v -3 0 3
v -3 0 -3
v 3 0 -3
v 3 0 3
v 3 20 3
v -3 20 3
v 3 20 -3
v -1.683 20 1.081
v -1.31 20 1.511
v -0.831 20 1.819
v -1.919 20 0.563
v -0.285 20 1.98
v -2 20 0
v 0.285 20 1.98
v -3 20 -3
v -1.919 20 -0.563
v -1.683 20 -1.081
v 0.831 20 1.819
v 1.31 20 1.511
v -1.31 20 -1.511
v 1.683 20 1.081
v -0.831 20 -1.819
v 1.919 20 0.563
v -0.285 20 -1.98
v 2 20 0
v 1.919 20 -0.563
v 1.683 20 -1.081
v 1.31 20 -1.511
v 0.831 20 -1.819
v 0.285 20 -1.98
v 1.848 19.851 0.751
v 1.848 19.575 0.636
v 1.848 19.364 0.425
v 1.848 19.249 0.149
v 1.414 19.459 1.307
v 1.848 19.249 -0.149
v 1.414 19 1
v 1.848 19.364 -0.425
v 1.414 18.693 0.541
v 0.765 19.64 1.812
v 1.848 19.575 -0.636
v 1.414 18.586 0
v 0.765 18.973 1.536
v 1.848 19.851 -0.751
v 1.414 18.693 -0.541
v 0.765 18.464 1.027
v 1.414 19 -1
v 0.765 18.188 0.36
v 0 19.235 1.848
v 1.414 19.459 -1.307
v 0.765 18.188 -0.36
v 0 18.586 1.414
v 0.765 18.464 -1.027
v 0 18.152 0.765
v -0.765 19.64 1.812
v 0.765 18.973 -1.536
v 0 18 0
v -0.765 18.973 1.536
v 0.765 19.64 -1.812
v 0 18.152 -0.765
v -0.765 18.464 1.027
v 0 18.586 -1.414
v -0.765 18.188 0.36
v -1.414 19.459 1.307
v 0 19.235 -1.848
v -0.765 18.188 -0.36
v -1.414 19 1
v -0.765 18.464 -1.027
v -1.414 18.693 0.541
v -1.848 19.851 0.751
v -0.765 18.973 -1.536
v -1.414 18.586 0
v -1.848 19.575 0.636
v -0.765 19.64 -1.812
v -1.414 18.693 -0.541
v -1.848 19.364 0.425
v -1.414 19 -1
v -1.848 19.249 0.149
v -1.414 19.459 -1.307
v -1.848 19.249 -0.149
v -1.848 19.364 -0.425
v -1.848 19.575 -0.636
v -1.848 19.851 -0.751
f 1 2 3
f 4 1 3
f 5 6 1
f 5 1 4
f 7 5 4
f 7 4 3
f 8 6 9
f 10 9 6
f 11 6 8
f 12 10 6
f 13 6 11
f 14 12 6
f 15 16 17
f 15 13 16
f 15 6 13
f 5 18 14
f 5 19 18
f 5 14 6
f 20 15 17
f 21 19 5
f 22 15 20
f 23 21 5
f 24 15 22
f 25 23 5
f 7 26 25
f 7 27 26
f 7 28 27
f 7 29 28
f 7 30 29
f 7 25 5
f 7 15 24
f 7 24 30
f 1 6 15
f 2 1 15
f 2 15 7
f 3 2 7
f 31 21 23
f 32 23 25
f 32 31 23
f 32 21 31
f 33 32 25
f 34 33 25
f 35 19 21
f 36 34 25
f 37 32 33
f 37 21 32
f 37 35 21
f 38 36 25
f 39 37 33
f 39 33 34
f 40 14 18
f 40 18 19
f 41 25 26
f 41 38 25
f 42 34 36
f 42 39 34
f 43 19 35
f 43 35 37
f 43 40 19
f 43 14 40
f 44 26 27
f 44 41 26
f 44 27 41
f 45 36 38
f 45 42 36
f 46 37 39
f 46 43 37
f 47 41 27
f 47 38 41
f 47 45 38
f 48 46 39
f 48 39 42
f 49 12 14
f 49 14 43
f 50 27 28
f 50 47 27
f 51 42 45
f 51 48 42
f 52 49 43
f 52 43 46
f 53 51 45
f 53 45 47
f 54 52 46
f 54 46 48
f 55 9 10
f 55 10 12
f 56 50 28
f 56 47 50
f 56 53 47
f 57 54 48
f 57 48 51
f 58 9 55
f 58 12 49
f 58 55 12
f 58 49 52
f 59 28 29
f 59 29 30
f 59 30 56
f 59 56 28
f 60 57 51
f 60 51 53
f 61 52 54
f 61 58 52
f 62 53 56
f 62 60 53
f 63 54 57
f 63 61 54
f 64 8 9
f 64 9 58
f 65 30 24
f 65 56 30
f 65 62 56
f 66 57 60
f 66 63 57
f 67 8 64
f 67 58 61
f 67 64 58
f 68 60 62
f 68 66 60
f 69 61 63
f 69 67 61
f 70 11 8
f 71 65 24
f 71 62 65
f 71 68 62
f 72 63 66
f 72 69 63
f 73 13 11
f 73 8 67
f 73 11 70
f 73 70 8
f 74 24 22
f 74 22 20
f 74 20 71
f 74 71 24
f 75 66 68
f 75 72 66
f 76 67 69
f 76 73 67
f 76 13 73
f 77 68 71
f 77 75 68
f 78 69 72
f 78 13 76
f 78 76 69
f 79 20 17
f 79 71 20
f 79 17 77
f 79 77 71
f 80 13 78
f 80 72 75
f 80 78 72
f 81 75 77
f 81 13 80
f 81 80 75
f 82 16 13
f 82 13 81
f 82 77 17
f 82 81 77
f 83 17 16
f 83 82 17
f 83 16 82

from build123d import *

# Parameters (mm, degrees)
SKETCH1_W           = 6
SKETCH1_H           = 6
BOSS_EXTRUDE1_DEPTH = 20


with BuildPart() as part:
    # Sketch1 → Boss-Extrude1 (new body)
    with BuildSketch(Plane(origin=(0, 0, 0), x_dir=(1, 0, 0), z_dir=(0, 1, 0))):
        Rectangle(SKETCH1_W, SKETCH1_H)
    extrude(amount=BOSS_EXTRUDE1_DEPTH)

    # Sketch3 → Cut-Revolve1 (revolve, cut)
    with BuildSketch(Plane(origin=(0, 20, 0), x_dir=(1, 0, 0), z_dir=(0, 1, 0))):
        with BuildLine():
            Line((-2, 0), (2, 0))
            ThreePointArc((2, 0), (0, 2), (-2, 0))
        make_face()
    revolve(axis=Axis((-2, 20, 0), (1, 0, 0)), mode=Mode.SUBTRACT)


solid = part.part
